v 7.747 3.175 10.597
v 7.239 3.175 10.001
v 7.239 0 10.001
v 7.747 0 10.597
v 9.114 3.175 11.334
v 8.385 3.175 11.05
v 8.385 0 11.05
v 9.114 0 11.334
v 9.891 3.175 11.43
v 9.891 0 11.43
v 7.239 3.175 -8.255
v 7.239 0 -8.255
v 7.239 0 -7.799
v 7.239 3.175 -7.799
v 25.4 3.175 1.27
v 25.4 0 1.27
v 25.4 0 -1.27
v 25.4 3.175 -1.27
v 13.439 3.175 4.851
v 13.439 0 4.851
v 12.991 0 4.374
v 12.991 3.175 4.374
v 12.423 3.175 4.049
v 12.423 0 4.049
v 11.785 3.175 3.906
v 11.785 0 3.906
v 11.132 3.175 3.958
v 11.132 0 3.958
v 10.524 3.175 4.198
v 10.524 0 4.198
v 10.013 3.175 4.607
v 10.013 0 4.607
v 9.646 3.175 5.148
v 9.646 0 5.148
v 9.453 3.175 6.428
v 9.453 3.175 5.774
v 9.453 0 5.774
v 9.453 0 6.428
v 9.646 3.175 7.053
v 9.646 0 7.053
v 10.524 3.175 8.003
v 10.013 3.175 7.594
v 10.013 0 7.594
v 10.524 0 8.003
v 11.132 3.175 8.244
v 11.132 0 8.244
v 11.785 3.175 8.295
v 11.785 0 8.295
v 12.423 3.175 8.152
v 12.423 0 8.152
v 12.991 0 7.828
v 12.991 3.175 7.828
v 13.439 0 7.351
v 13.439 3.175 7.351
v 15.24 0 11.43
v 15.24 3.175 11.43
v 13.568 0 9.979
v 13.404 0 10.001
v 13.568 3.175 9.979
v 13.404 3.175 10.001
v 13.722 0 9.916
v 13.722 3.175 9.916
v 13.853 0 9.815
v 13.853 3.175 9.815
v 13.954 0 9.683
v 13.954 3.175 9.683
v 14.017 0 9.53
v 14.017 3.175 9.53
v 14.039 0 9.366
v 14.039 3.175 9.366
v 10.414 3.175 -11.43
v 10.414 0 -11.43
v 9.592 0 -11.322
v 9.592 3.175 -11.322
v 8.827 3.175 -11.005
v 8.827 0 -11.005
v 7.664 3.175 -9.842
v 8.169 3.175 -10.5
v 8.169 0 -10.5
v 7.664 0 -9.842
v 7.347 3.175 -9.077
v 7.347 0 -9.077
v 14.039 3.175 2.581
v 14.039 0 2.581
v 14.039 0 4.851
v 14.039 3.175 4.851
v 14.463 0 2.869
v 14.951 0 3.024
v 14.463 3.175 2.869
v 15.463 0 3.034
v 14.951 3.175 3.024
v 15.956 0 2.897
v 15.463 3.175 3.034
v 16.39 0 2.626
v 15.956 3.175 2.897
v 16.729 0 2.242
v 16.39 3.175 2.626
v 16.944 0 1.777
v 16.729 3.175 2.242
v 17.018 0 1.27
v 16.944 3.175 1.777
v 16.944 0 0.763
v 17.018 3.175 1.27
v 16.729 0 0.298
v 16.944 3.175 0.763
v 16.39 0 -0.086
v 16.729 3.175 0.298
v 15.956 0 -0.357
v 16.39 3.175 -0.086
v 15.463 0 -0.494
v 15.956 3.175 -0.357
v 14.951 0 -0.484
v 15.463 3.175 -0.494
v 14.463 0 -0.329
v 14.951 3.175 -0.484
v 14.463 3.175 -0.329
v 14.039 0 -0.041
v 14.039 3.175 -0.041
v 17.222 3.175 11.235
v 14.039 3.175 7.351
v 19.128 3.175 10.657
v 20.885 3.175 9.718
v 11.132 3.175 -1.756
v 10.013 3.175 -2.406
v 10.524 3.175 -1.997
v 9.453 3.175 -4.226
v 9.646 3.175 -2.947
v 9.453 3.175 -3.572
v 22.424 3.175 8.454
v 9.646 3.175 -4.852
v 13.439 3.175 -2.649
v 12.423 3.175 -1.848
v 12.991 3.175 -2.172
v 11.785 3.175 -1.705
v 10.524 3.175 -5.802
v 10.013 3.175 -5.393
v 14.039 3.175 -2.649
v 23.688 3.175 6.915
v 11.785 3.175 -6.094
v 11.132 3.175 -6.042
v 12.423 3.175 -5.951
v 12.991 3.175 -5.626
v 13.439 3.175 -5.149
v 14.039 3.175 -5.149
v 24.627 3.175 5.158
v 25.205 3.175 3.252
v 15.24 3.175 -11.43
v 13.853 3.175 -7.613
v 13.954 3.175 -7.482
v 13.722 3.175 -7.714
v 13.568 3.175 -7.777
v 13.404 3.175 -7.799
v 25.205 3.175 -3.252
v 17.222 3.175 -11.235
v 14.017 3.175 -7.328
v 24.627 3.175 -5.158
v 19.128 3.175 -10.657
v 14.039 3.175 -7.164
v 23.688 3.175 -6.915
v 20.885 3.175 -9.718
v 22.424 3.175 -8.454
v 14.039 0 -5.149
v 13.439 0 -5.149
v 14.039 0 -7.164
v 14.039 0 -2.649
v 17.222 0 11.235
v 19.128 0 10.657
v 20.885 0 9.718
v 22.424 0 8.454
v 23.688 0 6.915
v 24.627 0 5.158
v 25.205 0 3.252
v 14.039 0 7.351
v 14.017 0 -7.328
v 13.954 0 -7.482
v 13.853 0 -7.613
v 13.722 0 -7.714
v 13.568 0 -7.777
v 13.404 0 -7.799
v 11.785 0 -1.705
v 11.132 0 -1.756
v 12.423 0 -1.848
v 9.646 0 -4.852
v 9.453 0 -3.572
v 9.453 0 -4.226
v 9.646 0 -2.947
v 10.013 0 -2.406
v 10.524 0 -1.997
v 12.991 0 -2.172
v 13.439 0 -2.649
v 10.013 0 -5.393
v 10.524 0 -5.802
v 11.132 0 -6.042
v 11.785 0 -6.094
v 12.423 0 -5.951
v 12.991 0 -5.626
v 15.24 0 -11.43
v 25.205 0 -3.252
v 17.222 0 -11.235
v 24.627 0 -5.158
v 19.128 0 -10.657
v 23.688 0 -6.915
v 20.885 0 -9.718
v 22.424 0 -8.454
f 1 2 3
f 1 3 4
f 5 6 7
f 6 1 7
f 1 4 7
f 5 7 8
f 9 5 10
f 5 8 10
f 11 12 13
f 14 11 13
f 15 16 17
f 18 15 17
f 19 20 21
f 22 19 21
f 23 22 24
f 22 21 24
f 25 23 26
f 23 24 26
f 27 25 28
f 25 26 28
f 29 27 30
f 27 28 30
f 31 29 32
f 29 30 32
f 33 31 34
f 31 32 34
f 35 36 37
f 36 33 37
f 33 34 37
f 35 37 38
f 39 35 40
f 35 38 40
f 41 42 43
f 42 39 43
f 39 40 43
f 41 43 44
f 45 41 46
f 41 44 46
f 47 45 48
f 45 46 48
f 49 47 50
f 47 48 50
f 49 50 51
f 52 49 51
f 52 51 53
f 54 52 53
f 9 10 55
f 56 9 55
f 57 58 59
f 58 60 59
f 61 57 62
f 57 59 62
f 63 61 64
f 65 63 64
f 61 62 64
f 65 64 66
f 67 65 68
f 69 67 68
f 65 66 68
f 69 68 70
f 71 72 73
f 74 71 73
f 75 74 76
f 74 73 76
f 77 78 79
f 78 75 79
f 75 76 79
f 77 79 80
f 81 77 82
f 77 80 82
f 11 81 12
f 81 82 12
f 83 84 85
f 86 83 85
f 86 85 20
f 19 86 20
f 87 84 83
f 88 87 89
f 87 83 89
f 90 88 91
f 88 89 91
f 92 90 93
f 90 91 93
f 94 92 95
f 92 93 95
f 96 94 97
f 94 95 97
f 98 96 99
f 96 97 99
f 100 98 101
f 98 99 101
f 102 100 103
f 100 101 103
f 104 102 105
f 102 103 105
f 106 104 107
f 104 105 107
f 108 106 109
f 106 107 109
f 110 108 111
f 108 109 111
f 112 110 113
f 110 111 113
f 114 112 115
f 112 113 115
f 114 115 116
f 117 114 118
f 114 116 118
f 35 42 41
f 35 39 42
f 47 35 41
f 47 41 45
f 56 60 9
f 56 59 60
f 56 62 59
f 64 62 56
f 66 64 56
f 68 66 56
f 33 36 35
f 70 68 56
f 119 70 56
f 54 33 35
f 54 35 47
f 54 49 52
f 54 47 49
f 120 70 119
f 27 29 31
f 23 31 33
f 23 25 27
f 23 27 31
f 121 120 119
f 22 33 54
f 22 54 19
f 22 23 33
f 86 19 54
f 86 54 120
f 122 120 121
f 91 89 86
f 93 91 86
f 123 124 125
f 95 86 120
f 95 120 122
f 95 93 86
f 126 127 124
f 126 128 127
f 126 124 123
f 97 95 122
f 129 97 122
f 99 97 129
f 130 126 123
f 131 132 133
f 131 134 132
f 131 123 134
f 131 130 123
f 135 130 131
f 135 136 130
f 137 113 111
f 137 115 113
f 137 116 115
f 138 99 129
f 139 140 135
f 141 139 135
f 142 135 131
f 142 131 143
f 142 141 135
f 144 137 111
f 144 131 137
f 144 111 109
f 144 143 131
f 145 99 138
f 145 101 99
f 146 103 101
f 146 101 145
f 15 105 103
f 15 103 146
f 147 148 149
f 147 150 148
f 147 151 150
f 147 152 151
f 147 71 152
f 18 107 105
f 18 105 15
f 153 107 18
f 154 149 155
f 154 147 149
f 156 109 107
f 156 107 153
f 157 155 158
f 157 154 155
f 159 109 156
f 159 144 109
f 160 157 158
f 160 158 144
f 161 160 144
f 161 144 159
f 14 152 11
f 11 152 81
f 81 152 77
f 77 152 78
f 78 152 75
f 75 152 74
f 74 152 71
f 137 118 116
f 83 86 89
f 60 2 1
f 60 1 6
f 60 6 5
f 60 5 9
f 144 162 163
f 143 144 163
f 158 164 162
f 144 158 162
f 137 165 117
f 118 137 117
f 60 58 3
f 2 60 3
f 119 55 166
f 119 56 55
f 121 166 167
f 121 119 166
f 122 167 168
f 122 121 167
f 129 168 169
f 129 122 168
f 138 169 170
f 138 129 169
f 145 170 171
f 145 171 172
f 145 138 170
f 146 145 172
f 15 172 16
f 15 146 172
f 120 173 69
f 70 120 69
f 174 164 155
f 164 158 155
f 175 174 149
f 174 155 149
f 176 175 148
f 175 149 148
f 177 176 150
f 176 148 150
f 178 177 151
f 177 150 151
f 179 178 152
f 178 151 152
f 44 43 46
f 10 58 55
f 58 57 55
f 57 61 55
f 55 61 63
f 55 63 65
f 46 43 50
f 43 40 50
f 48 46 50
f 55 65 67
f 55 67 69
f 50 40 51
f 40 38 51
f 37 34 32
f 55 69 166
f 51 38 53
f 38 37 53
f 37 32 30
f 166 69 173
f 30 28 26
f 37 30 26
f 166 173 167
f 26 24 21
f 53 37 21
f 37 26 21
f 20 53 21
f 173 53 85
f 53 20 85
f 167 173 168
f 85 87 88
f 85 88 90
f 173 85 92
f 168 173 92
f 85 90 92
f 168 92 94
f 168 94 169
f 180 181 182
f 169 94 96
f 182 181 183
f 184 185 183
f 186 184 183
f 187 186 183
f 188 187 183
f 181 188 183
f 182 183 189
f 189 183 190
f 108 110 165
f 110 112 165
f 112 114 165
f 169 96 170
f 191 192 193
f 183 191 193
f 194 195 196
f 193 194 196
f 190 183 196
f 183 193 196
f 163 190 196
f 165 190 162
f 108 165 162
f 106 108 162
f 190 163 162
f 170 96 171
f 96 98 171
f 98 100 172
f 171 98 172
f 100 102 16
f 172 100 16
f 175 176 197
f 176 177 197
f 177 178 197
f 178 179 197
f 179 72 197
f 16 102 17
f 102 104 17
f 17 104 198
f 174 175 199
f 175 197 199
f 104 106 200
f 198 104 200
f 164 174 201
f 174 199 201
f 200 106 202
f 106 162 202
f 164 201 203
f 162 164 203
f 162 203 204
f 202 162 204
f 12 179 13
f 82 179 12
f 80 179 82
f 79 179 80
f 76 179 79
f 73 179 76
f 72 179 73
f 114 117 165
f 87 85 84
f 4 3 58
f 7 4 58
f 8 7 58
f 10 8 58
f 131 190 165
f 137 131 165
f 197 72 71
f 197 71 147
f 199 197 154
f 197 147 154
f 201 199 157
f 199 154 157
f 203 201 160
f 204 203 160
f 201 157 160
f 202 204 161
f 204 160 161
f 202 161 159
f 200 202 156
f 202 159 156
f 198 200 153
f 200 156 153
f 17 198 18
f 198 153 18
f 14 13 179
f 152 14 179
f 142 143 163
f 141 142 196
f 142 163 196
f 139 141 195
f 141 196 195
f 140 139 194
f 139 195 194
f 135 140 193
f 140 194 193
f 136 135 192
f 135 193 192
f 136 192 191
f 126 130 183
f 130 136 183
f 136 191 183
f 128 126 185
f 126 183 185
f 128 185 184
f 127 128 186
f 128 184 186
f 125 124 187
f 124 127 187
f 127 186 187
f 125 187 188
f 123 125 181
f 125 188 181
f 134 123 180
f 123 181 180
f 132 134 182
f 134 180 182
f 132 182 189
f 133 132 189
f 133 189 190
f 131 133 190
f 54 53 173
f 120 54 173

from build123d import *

# Parameters (mm, degrees)
SKETCH1_W           = 50.8
SKETCH1_H           = 22.86
BOSS_EXTRUDE1_DEPTH = 3.175
FILLET1_R           = 10.16
SKETCH3_R           = 1.778
CUT_EXTRUDE1_DEPTH  = 29.033649869
FILLET3_R           = 10.16
CUT_EXTRUDE3_DEPTH  = 29.033649869
FILLET4_R           = 0.635
FILLET5_R           = 3.175


with BuildPart() as part:
    # Sketch1 → Boss-Extrude1 (new body)
    with BuildSketch(Plane(origin=(0, 0, 0), x_dir=(1, 0, 0), z_dir=(0, 1, 0))):
        Rectangle(SKETCH1_W, SKETCH1_H)
    extrude(amount=BOSS_EXTRUDE1_DEPTH)

    # Fillet1
    fillet1_edges = [part.edges().sort_by_distance(p)[0] for p in [
        (25.4, 1.5875, 11.43),
        (-25.4, 1.5875, 11.43),
    ]]
    fillet(fillet1_edges, radius=FILLET1_R)

    # Sketch3 → Cut-Extrude1 (cut, through all)
    with BuildSketch(Plane(origin=(0, 3.175, 0), x_dir=(1, 0, 0), z_dir=(0, 1, 0))):
        with Locations(Location((15.24, -1.27, 0), (0, 0, 270))):
            Circle(SKETCH3_R)
        with Locations(Location((-3.81, -1.27, 0), (0, 0, 270))):
            Circle(SKETCH3_R)
    extrude(amount=-CUT_EXTRUDE1_DEPTH, mode=Mode.SUBTRACT)

    # Fillet3
    fillet3_edges = [part.edges().sort_by_distance(p)[0] for p in [
        (-25.4, 1.5875, -11.43),
        (25.4, 1.5875, -11.43),
    ]]
    fillet(fillet3_edges, radius=FILLET3_R)

    # Sketch5 → Cut-Extrude3 (cut, through all)
    with BuildSketch(Plane.XZ):
        with BuildLine():
            Line((7.239, -11.43), (7.239, -7.799110591))
            Line((7.239, -7.799110591), (14.039031064, -7.799110591))
            Line((14.039031064, -7.799110591), (14.039031064, -5.149110591))
            Line((14.039031064, -5.149110591), (13.439031064, -5.149110591))
            ThreePointArc((13.439031064, -5.149110591), (9.428644365, -3.899110591), (13.439031064, -2.649110591))
            Line((13.439031064, -2.649110591), (14.039031064, -2.649110591))
            Line((14.039031064, -2.649110591), (14.039031064, 4.850889409))
            Line((14.039031064, 4.850889409), (13.439031064, 4.850889409))
            ThreePointArc((13.439031064, 4.850889409), (9.428644366, 6.100889409), (13.439031064, 7.350889409))
            Line((13.439031064, 7.350889409), (14.039031064, 7.350889409))
            Line((14.039031064, 7.350889409), (14.039031064, 10.000889409))
            Line((14.039031064, 10.000889409), (7.239, 10.000889409))
            Line((7.239, 10.000889409), (7.239, 11.43))
            Line((7.239, 11.43), (-25.4, 11.43))
            Line((-25.4, 11.43), (-25.4, -11.43))
            Line((-25.4, -11.43), (7.239, -11.43))
        make_face()
    extrude(amount=-CUT_EXTRUDE3_DEPTH, mode=Mode.SUBTRACT)

    # Fillet4
    fillet4_edges = [part.edges().sort_by_distance(p)[0] for p in [
        (14.039031064, 1.5875, 10.000889409),
        (14.039031064, 1.5875, -7.799110591),
    ]]
    fillet(fillet4_edges, radius=FILLET4_R)

    # Fillet5
    # the kernel refuses this fillet: 3.175 mm, written as the material it takes off along each edge
    with BuildSketch(Plane(origin=(7.239, -7.9375, -11.43), x_dir=(1, 0, 0), z_dir=(0, 1, 0))) as fillet5_piece_1:
        with BuildLine():
            CenterArc((FILLET5_R, -FILLET5_R), FILLET5_R, 90, 90)
            Line((0, -FILLET5_R), (-FILLET5_R * 0.02, -FILLET5_R))
            Line((-FILLET5_R * 0.02, -FILLET5_R), (-FILLET5_R * 0.02, FILLET5_R * 0.02))
            Line((-FILLET5_R * 0.02, FILLET5_R * 0.02), (FILLET5_R, FILLET5_R * 0.02))
            Line((FILLET5_R, FILLET5_R * 0.02), (FILLET5_R, 0))
        make_face()
    extrude(amount=19.05, mode=Mode.SUBTRACT)
    with BuildSketch(Plane(origin=(7.239, -6.629713028, 11.43), x_dir=(1.52265132002689e-12, 0, -1.0), z_dir=(0, 1, 0))) as fillet5_piece_2:
        with BuildLine():
            CenterArc((3.175, -2.651885211), FILLET5_R, 123.359221801, 56.640778199)
            Line((0, -2.651885211), (-0.0635, -2.651885211))
            Line((-0.0635, -2.651885211), (-0.0635, 0))
            Line((-0.0635, 0), (0, 0.0635))
            ThreePointArc((0, 0.0635), (0.714555296, 0.0635), (1.394192803, 0.053037704))
            Line((1.394192803, 0.053037704), (1.429110591, 0))
        make_face()
    extrude(amount=16.434426055, mode=Mode.SUBTRACT)


solid = part.part
